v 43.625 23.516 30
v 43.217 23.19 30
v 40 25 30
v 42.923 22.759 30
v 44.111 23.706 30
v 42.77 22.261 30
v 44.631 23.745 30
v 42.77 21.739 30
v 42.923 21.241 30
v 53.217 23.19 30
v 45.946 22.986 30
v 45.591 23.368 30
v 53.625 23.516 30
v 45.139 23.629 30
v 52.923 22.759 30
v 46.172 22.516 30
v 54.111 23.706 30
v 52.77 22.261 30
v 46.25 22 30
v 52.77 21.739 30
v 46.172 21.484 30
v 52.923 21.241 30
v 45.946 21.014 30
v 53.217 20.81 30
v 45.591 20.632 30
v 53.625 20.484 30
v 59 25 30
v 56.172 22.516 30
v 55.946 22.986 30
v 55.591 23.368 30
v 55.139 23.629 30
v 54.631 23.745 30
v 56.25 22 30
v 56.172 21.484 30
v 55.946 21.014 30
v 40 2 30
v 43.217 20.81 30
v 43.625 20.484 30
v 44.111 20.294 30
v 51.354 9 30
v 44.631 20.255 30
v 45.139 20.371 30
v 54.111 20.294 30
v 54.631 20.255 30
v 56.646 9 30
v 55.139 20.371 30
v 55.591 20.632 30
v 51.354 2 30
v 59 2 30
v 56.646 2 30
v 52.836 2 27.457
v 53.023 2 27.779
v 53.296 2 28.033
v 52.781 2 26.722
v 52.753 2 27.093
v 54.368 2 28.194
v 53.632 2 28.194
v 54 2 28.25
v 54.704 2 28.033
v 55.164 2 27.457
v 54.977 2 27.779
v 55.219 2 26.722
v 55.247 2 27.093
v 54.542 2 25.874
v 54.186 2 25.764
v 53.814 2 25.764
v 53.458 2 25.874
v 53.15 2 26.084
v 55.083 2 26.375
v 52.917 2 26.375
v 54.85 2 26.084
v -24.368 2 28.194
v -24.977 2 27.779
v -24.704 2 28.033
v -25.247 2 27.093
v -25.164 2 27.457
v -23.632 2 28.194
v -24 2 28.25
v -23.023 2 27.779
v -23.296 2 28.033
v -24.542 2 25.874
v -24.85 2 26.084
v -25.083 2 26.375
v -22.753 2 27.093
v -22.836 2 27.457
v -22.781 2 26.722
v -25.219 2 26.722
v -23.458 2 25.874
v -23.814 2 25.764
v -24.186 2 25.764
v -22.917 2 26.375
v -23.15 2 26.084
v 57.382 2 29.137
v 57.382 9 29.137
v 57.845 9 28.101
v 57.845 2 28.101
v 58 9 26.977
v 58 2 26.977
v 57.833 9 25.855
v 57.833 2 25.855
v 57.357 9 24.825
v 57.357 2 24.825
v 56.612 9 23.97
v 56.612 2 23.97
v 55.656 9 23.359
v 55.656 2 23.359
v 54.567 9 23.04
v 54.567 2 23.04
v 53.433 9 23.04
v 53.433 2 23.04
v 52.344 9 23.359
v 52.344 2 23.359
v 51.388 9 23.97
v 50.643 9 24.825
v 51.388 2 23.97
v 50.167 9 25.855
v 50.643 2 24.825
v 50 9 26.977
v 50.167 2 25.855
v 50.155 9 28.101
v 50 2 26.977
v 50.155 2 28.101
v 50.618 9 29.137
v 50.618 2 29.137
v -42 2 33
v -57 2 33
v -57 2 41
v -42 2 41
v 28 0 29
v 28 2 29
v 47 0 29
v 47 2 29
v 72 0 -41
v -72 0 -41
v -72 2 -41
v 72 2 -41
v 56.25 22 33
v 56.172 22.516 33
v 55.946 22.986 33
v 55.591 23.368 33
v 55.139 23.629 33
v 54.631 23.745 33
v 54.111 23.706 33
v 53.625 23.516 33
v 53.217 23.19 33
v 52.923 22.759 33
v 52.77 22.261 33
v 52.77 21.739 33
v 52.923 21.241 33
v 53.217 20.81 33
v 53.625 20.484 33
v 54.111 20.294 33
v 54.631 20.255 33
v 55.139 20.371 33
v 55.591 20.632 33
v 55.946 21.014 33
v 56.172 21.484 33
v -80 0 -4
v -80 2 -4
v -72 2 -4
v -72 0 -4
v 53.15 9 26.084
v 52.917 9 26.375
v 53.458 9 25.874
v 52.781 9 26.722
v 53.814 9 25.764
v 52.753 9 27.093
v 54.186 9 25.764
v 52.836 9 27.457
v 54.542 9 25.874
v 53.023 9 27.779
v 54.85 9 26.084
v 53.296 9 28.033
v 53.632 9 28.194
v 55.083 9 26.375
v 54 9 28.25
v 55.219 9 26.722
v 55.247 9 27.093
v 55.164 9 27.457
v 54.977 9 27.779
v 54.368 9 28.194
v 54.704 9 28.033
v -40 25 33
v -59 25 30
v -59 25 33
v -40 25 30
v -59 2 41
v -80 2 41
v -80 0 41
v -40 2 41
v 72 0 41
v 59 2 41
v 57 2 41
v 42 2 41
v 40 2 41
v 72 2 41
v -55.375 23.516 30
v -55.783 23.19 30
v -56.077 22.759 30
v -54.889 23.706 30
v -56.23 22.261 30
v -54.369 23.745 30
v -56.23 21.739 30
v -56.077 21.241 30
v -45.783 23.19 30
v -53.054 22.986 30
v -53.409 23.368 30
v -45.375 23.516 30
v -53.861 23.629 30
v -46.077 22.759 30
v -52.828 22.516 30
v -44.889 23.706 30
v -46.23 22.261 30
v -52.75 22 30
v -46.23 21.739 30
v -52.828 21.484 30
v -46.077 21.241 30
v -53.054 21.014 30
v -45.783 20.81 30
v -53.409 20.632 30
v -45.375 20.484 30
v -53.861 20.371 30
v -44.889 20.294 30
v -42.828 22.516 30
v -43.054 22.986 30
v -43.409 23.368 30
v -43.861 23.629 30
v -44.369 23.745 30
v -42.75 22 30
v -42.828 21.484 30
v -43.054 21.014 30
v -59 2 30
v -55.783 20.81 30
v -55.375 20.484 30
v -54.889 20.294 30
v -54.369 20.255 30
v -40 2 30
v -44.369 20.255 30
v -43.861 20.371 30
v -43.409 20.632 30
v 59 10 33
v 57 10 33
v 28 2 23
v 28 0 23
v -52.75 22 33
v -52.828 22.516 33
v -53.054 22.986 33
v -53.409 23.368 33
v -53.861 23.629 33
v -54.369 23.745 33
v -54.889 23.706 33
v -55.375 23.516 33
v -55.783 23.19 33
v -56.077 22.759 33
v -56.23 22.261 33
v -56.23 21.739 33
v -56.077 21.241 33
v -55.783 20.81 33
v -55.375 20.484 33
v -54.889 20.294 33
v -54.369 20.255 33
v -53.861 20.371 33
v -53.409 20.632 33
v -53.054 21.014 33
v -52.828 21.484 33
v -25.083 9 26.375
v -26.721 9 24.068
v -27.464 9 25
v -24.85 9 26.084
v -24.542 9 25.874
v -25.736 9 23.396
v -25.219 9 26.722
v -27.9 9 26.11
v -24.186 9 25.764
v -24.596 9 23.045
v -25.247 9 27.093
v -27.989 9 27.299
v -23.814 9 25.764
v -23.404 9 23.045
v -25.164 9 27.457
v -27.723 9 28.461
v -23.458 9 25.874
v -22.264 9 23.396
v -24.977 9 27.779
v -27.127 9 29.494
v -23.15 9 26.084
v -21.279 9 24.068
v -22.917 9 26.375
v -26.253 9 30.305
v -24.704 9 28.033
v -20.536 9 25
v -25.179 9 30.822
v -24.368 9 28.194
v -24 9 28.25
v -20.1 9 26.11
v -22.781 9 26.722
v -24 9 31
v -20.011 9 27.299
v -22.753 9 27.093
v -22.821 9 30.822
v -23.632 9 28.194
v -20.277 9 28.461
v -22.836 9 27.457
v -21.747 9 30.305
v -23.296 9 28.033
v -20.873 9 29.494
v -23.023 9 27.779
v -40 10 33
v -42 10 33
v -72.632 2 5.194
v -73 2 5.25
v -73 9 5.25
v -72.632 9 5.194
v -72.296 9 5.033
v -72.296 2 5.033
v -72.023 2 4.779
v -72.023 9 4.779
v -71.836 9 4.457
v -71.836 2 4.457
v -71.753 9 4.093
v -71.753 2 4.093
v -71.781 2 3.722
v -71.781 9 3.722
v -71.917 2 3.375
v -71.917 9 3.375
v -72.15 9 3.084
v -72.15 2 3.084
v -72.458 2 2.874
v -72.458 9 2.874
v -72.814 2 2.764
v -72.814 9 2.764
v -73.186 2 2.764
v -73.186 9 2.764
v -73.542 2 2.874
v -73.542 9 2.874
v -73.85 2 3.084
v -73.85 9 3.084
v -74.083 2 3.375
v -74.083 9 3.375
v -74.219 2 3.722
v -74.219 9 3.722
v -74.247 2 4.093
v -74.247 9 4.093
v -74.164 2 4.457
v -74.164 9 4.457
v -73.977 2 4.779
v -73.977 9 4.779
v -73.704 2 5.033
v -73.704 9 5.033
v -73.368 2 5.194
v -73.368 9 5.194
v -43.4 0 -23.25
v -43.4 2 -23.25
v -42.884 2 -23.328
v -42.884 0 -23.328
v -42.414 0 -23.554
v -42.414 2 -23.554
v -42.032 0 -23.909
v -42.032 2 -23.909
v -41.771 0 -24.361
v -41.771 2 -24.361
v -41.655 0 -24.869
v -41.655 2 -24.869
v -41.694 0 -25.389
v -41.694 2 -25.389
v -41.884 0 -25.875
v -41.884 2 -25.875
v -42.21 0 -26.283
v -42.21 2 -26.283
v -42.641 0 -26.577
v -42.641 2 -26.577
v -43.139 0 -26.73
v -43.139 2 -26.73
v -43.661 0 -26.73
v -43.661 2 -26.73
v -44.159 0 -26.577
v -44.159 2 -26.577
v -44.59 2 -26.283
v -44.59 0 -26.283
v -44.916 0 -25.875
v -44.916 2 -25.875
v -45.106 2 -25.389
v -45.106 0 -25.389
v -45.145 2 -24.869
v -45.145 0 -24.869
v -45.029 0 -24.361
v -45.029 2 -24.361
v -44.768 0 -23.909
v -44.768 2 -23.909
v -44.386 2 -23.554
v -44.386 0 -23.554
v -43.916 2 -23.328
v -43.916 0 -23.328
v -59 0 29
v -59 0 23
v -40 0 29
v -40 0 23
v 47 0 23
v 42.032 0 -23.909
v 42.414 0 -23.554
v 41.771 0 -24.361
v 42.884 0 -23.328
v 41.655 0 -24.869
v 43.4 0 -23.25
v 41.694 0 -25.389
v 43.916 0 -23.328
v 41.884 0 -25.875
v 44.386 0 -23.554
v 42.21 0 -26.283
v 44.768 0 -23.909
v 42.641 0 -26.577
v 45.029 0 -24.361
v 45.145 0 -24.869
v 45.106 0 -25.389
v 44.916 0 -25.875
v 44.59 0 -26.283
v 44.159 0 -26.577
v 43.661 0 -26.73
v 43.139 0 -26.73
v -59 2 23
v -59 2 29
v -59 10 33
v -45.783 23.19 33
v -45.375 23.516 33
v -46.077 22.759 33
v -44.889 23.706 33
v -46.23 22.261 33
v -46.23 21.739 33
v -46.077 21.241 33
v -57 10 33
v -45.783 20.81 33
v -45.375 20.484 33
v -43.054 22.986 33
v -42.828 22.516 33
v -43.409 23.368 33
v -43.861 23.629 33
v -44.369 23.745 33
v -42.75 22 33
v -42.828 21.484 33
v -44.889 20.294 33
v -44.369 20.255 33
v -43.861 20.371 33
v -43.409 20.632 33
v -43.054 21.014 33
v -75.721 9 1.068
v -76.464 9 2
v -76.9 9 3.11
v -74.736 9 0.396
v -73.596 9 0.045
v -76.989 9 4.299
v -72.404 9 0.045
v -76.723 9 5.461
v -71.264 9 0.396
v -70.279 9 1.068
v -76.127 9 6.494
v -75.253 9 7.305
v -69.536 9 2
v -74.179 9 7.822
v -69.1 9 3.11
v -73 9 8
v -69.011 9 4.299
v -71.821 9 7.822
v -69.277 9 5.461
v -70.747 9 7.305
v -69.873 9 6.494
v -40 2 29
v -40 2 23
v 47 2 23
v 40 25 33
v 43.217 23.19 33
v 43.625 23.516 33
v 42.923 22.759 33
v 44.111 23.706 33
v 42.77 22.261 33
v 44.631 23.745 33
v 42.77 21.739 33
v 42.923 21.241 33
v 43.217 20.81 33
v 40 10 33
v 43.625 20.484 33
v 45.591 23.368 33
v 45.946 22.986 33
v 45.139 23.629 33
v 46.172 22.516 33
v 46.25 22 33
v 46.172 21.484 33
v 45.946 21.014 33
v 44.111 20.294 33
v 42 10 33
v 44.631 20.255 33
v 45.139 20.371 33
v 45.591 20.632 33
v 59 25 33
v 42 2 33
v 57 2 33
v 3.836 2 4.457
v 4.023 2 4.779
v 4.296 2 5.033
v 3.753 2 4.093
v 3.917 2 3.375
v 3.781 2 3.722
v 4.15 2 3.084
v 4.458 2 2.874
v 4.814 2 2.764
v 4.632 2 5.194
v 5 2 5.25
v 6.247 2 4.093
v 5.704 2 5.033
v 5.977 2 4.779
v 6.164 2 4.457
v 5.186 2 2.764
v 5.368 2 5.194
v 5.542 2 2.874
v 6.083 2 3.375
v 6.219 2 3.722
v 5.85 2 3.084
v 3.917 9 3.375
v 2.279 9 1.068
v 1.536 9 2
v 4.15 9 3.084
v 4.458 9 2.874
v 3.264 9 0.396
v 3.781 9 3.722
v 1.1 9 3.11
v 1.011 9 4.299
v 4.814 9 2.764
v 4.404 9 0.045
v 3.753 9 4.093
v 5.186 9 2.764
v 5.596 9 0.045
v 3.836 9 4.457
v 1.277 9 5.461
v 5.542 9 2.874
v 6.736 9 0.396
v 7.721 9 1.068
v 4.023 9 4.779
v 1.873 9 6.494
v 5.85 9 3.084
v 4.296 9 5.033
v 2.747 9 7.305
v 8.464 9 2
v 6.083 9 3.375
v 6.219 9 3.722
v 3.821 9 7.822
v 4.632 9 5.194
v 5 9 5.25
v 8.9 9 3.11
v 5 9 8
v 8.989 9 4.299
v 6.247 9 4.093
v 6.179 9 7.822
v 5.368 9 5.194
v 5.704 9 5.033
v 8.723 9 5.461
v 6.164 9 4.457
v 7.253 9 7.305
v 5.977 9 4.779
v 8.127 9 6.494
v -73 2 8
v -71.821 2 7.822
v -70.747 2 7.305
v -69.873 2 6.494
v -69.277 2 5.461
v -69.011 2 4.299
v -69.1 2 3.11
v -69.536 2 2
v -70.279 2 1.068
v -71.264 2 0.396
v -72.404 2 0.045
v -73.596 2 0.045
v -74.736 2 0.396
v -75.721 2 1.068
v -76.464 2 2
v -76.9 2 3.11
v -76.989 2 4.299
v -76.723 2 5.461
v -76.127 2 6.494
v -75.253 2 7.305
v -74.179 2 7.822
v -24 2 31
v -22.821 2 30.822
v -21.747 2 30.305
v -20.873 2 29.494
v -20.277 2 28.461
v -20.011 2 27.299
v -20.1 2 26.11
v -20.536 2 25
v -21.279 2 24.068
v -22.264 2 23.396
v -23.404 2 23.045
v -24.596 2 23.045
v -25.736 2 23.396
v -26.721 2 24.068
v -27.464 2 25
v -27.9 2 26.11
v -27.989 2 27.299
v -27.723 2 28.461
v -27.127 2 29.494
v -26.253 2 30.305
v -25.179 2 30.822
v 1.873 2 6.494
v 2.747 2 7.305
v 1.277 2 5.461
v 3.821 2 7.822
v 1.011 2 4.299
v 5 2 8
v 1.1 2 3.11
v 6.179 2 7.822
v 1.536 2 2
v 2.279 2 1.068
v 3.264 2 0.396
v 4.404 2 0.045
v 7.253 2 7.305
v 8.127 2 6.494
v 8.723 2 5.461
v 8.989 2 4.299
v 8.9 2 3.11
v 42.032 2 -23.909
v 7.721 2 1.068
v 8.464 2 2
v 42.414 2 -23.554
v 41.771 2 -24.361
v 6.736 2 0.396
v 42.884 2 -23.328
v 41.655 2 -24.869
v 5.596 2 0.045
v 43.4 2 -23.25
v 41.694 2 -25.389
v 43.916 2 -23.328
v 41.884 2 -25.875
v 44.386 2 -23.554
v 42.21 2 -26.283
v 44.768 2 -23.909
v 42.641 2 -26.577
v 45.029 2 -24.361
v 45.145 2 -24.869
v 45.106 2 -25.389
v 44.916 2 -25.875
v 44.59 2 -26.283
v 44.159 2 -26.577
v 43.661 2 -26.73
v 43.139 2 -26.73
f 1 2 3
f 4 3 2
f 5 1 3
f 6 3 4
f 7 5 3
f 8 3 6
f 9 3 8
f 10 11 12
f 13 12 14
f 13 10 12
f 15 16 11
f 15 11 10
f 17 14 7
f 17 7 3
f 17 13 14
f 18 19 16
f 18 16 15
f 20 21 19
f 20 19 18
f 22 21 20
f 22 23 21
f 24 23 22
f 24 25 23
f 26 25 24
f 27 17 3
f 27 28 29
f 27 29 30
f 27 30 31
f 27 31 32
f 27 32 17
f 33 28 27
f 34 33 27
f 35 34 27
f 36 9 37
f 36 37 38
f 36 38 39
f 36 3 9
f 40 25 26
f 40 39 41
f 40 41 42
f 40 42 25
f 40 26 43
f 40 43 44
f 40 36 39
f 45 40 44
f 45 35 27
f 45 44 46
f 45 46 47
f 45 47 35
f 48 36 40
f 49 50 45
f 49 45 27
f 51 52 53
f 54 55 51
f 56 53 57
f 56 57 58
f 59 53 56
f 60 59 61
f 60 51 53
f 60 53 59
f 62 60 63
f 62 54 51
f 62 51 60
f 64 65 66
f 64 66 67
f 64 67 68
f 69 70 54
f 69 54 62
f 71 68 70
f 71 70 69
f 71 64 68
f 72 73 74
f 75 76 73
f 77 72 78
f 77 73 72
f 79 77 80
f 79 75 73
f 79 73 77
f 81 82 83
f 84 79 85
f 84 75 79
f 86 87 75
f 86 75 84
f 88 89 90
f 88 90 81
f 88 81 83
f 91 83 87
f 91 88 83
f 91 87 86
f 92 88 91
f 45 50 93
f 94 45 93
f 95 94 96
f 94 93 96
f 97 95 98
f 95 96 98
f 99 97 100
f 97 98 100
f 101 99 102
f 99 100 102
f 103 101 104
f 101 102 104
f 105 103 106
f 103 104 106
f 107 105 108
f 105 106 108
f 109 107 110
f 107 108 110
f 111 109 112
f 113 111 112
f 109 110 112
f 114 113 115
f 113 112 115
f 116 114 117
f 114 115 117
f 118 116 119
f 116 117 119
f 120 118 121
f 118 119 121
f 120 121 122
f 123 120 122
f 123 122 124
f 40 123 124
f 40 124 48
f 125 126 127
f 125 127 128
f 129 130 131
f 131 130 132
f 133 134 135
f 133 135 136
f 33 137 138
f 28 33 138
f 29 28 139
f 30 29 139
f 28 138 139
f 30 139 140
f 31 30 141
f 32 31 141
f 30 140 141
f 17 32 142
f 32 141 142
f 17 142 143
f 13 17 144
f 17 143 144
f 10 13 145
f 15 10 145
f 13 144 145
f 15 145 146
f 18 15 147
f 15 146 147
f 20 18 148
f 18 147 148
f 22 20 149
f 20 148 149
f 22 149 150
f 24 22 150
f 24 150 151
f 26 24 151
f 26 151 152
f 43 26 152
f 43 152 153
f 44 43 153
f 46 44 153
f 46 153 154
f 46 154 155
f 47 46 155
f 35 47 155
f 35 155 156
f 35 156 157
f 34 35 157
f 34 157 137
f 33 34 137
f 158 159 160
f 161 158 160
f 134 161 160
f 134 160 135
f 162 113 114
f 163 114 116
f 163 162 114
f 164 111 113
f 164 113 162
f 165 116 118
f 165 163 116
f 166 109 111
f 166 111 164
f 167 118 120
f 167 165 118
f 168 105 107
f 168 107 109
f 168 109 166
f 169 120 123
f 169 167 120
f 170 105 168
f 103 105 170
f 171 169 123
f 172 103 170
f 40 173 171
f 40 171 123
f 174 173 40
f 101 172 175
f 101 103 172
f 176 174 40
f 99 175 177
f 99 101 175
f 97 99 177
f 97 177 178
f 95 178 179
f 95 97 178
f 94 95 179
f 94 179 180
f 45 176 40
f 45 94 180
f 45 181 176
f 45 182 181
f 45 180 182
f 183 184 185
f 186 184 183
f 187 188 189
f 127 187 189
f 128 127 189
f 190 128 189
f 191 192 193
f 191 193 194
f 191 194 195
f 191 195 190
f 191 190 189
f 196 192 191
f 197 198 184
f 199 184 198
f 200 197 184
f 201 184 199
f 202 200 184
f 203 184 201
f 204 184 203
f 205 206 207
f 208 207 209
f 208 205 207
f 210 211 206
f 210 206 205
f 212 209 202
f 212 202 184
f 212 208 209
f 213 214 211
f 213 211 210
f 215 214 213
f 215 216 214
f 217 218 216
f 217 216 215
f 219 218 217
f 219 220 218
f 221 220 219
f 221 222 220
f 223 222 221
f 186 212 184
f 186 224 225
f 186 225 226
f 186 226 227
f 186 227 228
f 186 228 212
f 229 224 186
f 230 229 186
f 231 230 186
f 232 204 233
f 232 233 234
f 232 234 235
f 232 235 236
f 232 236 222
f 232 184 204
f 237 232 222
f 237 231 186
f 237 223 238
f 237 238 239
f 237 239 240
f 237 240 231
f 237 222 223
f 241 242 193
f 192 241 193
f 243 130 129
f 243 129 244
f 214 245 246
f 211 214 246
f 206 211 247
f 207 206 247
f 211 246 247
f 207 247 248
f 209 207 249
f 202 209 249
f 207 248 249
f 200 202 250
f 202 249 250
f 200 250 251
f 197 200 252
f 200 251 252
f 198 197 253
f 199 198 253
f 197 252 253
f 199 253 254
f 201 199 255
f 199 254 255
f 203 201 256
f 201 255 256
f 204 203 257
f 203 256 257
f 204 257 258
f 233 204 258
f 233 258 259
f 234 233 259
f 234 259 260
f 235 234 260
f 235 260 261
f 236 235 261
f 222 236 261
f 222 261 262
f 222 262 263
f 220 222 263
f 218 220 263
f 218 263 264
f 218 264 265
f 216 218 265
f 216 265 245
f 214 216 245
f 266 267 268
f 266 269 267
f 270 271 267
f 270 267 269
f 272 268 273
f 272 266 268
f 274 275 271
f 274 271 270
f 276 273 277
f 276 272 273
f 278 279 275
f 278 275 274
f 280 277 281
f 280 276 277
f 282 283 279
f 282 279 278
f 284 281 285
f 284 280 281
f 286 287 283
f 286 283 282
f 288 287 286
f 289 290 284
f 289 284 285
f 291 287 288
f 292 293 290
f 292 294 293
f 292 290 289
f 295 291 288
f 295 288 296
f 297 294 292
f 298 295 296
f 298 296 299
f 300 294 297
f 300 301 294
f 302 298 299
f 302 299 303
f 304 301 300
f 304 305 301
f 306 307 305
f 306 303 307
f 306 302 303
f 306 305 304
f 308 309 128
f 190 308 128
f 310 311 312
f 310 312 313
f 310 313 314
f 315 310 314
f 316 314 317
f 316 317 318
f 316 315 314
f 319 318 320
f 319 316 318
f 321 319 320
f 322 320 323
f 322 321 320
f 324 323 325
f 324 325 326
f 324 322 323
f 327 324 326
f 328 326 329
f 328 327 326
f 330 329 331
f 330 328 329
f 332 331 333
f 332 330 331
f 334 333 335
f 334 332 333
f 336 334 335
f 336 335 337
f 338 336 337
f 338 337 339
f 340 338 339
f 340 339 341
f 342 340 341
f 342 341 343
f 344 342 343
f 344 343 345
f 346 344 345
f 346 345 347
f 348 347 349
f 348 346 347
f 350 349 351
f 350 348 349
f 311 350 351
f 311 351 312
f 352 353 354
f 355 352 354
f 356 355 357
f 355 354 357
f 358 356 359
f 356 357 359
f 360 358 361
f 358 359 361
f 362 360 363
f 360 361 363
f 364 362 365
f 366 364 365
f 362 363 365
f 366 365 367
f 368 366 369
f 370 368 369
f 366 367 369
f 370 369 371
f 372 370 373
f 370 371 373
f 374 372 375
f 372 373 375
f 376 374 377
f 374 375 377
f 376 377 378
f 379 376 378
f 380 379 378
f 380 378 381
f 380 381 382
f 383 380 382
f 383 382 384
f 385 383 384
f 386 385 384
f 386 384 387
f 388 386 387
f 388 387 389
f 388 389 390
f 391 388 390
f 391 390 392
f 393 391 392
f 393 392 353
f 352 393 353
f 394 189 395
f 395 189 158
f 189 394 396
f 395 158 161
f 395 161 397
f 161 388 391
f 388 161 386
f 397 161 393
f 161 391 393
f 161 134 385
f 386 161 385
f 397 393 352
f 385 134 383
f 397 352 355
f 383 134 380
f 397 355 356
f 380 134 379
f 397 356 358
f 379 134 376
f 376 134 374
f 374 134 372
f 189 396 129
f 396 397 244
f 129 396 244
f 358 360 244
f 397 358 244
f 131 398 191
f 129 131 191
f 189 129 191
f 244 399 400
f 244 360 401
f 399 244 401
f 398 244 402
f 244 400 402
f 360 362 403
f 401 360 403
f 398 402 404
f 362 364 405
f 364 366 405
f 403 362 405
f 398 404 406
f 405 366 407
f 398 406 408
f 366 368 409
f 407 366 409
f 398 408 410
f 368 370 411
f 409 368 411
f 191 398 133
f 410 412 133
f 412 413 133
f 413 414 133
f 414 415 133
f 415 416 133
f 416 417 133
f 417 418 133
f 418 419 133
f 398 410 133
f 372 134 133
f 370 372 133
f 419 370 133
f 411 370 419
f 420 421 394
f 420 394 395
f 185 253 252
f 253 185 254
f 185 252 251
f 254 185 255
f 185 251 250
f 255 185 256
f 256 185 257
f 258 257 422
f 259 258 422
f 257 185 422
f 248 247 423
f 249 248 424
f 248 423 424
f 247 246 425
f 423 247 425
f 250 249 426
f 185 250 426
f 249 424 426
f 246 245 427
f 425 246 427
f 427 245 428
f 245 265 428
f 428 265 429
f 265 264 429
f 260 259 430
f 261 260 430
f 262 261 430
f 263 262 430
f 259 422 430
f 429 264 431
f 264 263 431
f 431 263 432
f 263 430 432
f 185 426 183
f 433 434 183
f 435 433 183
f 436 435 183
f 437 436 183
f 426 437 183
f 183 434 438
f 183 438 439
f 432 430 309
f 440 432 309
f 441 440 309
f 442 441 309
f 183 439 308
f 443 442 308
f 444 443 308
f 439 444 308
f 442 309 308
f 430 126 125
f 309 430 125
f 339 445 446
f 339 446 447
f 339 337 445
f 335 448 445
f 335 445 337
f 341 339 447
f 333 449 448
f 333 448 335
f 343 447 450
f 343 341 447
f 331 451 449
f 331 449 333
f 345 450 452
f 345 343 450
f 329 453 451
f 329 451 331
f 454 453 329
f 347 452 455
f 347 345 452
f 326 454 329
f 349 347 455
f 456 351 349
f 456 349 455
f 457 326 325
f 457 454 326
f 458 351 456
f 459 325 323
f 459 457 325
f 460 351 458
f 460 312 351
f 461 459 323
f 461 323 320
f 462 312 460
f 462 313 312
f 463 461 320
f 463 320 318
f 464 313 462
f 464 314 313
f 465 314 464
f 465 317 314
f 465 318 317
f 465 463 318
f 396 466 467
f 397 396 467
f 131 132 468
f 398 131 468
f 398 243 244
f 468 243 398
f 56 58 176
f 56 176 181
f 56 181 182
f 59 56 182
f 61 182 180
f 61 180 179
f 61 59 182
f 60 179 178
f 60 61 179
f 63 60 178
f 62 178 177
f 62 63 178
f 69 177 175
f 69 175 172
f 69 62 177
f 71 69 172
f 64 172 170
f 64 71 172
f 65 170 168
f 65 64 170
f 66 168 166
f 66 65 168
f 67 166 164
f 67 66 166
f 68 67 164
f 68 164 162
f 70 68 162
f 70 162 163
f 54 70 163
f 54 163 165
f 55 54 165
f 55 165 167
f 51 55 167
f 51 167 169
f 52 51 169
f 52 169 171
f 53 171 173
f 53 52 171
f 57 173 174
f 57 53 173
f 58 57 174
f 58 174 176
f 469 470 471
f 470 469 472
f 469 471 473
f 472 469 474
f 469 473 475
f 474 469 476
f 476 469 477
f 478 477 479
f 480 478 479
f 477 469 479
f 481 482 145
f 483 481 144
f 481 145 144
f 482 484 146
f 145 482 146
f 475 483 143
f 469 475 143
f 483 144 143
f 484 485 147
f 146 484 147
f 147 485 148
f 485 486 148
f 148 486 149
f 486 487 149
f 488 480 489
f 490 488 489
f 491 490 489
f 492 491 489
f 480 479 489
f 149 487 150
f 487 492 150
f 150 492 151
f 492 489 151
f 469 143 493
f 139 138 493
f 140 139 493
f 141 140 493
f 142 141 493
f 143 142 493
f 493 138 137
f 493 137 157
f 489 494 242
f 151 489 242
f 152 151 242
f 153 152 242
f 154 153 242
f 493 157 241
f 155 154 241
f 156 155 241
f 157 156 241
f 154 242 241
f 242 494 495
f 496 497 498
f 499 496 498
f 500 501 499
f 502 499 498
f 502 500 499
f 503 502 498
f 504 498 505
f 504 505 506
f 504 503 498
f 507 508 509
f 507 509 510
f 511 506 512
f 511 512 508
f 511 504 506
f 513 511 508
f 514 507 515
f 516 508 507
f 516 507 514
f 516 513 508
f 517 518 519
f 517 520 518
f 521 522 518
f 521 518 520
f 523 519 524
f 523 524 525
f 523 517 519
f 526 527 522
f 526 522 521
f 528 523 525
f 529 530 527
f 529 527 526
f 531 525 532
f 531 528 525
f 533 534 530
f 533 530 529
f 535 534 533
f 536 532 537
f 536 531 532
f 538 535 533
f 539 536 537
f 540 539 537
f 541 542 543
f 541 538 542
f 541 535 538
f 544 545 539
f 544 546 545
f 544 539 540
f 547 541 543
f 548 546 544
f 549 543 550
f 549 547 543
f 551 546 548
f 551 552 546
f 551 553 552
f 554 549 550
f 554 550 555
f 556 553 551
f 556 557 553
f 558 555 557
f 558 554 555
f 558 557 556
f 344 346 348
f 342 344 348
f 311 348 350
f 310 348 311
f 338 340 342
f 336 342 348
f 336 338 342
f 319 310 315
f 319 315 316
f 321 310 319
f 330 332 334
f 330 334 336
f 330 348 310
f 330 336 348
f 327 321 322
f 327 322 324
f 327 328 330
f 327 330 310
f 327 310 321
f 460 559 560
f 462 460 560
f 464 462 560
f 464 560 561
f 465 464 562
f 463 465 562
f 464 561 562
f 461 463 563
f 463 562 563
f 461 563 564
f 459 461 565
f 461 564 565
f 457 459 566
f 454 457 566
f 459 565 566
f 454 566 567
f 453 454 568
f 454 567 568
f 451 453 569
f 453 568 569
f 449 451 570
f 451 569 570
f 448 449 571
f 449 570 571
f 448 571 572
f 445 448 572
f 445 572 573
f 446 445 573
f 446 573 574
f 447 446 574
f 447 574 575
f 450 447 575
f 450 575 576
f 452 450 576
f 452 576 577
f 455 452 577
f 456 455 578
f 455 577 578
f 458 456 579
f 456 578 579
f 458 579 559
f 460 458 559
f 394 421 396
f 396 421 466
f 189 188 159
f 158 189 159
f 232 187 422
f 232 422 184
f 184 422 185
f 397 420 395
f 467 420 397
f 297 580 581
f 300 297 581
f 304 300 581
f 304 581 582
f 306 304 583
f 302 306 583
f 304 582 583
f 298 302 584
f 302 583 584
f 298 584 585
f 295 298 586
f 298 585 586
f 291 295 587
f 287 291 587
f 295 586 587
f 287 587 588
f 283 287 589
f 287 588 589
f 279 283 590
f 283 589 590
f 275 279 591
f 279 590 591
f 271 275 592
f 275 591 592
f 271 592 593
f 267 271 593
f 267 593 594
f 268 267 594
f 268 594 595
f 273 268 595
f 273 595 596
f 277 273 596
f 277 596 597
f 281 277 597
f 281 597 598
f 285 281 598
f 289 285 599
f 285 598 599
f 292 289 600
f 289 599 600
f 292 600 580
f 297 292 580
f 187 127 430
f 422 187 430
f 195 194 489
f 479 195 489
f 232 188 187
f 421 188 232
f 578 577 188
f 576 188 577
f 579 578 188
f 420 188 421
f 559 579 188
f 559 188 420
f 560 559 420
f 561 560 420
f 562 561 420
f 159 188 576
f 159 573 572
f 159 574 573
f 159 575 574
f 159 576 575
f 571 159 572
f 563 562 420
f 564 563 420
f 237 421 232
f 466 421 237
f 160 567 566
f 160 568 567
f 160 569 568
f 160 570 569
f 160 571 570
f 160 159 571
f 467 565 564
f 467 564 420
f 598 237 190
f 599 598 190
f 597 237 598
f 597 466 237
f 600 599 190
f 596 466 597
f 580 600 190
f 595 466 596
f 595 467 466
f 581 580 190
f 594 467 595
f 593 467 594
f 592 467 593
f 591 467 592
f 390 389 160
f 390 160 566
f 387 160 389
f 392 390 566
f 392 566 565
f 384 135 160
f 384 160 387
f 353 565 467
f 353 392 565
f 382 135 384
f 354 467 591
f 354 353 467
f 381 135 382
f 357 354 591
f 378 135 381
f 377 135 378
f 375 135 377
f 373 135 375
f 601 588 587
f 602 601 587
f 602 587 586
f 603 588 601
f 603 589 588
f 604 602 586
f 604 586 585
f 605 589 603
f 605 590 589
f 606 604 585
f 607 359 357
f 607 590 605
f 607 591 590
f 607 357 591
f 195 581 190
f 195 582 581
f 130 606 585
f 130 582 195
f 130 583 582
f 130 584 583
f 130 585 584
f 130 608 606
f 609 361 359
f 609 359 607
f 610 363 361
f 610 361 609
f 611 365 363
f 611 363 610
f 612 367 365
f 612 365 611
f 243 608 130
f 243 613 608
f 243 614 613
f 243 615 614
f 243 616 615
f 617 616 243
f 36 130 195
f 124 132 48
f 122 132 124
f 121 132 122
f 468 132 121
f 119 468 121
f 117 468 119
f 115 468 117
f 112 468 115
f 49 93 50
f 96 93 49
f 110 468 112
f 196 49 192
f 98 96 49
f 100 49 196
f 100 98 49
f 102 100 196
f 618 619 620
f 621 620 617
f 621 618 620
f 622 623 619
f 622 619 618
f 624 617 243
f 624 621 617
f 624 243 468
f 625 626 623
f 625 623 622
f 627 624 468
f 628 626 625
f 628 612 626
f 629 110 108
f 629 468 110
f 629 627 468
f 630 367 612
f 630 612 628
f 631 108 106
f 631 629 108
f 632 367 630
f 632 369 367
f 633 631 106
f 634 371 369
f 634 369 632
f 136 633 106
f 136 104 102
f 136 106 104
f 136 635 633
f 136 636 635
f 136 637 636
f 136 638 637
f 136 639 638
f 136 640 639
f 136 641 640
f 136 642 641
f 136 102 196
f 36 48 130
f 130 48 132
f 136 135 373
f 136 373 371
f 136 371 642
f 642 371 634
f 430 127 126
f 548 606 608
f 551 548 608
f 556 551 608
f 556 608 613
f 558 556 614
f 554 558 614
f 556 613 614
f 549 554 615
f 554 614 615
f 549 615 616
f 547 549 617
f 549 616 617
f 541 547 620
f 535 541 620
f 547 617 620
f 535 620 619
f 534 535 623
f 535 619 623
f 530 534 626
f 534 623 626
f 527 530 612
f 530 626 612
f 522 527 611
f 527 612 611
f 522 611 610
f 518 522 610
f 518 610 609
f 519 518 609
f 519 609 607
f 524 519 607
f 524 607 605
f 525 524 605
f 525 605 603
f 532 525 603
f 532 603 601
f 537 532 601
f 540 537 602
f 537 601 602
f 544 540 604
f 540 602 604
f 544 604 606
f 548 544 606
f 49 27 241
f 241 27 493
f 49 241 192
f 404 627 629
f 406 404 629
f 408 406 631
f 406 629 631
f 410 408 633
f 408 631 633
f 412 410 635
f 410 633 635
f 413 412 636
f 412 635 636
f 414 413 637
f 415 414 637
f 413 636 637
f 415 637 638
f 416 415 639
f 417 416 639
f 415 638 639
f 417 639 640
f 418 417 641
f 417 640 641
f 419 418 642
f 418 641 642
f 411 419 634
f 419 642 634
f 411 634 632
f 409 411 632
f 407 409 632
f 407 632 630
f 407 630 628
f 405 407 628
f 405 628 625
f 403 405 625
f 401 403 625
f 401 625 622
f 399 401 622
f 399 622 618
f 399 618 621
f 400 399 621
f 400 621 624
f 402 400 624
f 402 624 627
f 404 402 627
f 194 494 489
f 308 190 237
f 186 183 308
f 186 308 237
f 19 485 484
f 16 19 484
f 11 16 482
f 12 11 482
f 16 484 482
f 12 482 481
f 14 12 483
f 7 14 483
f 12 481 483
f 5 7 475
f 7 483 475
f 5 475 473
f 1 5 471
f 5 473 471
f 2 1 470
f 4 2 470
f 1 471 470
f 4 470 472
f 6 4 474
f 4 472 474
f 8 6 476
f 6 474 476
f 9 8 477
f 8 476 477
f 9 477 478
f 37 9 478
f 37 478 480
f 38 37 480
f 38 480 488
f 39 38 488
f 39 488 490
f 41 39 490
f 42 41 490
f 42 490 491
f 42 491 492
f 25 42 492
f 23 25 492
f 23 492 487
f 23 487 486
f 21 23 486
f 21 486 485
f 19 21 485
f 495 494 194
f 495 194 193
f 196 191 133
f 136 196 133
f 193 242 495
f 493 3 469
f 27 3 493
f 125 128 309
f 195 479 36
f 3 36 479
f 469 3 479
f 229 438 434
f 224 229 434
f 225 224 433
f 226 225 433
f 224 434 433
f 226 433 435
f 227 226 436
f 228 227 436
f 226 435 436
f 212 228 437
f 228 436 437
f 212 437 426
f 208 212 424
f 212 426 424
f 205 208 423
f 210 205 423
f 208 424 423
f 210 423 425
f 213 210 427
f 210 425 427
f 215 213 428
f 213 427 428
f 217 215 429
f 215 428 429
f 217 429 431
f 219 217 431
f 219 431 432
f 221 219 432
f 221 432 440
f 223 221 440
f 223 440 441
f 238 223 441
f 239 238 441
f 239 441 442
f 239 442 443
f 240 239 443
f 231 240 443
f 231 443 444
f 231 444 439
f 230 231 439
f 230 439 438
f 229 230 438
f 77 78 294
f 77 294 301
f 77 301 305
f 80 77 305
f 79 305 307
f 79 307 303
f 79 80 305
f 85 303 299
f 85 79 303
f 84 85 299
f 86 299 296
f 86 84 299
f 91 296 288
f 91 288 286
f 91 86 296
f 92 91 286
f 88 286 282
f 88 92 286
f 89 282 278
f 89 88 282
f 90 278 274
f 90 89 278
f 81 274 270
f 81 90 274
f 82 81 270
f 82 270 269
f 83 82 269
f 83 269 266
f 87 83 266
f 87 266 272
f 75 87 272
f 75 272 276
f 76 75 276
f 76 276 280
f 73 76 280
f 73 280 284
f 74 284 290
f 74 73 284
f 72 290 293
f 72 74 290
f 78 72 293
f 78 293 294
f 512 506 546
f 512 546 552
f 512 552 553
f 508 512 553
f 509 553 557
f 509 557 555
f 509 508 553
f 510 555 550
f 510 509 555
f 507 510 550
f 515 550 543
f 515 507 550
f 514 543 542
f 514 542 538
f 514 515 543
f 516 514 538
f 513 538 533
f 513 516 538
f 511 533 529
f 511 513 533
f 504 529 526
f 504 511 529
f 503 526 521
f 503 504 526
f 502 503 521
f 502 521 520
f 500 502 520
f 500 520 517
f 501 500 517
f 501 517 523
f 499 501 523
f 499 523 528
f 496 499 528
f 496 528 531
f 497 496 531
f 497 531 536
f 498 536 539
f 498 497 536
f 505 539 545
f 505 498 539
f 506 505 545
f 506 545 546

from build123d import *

# Parameters (mm, degrees)
CROQUIS1_W              = 144
CROQUIS1_H              = 82
SALIENTE_EXTRUIR1_DEPTH = 2
CROQUIS3_W              = 8
CROQUIS3_H              = 45
SALIENTE_EXTRUIR2_DEPTH = 2
CROQUIS2_R              = 4
CROQUIS2_R_2            = 1.25
SALIENTE_EXTRUIR3_DEPTH = 7
CORTAR_EXTRUIR1_REACH   = 92.167
CROQUIS4_W              = 19
CROQUIS4_H              = 6
CORTAR_EXTRUIR2_REACH   = 92.167
CROQUIS5_R              = 1.75
CROQUIS7_W              = 19
CROQUIS7_H              = 3
SALIENTE_EXTRUIR4_DEPTH = 23
CORTAR_EXTRUIR3_REACH   = 113.808
CROQUIS9_R              = 1.75
NERVIO1_REACH           = 141.524
CROQUIS10_WALL_W        = 292.3620914
CROQUIS10_WALL_H        = 2
NERVIO2_REACH           = 123.861
CROQUIS11_WALL_W        = 257.034860638
CROQUIS11_WALL_H        = 2
NERVIO3_REACH           = 149.061
CROQUIS12_WALL_W        = 307.43613199
CROQUIS12_WALL_H        = 2
NERVIO4_REACH           = 131.252
CROQUIS13_WALL_W        = 271.81709339
CROQUIS13_WALL_H        = 2


with BuildPart() as part:
    # Croquis1 → Saliente-Extruir1 (new body)
    with BuildSketch(Plane(origin=(0, 0, 0), x_dir=(1, 0, 0), z_dir=(0, 1, 0))):
        Rectangle(CROQUIS1_W, CROQUIS1_H)
    extrude(amount=SALIENTE_EXTRUIR1_DEPTH)

    # Croquis3 → Saliente-Extruir2 (add)
    with BuildSketch(Plane(origin=(0, 2, 0), x_dir=(1, 0, 0), z_dir=(0, 1, 0))):
        with Locations((-76, -18.5)):
            Rectangle(CROQUIS3_W, CROQUIS3_H)
    extrude(amount=-SALIENTE_EXTRUIR2_DEPTH)

    # Croquis2 → Saliente-Extruir3 (add)
    # profile 1 of 4: a face of its own
    with BuildSketch(Plane(origin=(0, 2, 0), x_dir=(1, 0, 0), z_dir=(0, 1, 0))):
        with Locations((54, -27)):
            Circle(CROQUIS2_R)
        with Locations((54, -27)):
            Circle(CROQUIS2_R_2, mode=Mode.SUBTRACT)
    # profile 2 of 4: a face of its own
    with BuildSketch(Plane(origin=(0, 2, 0), x_dir=(1, 0, 0), z_dir=(0, 1, 0))):
        with Locations((5, -4)):
            Circle(CROQUIS2_R)
        with Locations((5, -4)):
            Circle(CROQUIS2_R_2, mode=Mode.SUBTRACT)
    # profile 3 of 4: a face of its own
    with BuildSketch(Plane(origin=(0, 2, 0), x_dir=(1, 0, 0), z_dir=(0, 1, 0))):
        with Locations((-24, -27)):
            Circle(CROQUIS2_R)
        with Locations((-24, -27)):
            Circle(CROQUIS2_R_2, mode=Mode.SUBTRACT)
    # profile 4 of 4: a face of its own
    with BuildSketch(Plane(origin=(0, 2, 0), x_dir=(1, 0, 0), z_dir=(0, 1, 0))):
        with Locations((-73, -4)):
            Circle(CROQUIS2_R)
        with Locations((-73, -4)):
            Circle(CROQUIS2_R_2, mode=Mode.SUBTRACT)
    extrude(amount=SALIENTE_EXTRUIR3_DEPTH)

    # Croquis4 → Cortar-Extruir1 (cut, up to next)
    with BuildSketch(Plane(origin=(0, 2, 0), x_dir=(1, 0, 0), z_dir=(0, 1, 0)), mode=Mode.PRIVATE) as cortar_extruir1_sk1:
        with Locations((-49.5, -26)):
            Rectangle(CROQUIS4_W, CROQUIS4_H)
    cortar_extruir1_tool1 = extrude(cortar_extruir1_sk1.sketch, amount=-CORTAR_EXTRUIR1_REACH, mode=Mode.PRIVATE) & part.part
    # Croquis4 → Cortar-Extruir1 (cut, up to next)
    with BuildSketch(Plane(origin=(0, 2, 0), x_dir=(1, 0, 0), z_dir=(0, 1, 0)), mode=Mode.PRIVATE) as cortar_extruir1_sk2:
        with Locations((37.5, -26)):
            Rectangle(CROQUIS4_W, CROQUIS4_H)
    cortar_extruir1_tool2 = extrude(cortar_extruir1_sk2.sketch, amount=-CORTAR_EXTRUIR1_REACH, mode=Mode.PRIVATE) & part.part
    add(cortar_extruir1_tool1.solids().sort_by_distance((-49.5, 2, 26))[0], mode=Mode.SUBTRACT)
    add(cortar_extruir1_tool2.solids().sort_by_distance((37.5, 2, 26))[0], mode=Mode.SUBTRACT)

    # Croquis5 → Cortar-Extruir2 (cut, up to next)
    with BuildSketch(Plane(origin=(0, 2, 0), x_dir=(1, 0, 0), z_dir=(0, 1, 0)), mode=Mode.PRIVATE) as cortar_extruir2_sk1:
        with Locations((-43.4, 25)):
            Circle(CROQUIS5_R)
    cortar_extruir2_tool1 = extrude(cortar_extruir2_sk1.sketch, amount=-CORTAR_EXTRUIR2_REACH, mode=Mode.PRIVATE) & part.part
    # Croquis5 → Cortar-Extruir2 (cut, up to next)
    with BuildSketch(Plane(origin=(0, 2, 0), x_dir=(1, 0, 0), z_dir=(0, 1, 0)), mode=Mode.PRIVATE) as cortar_extruir2_sk2:
        with Locations((43.4, 25)):
            Circle(CROQUIS5_R)
    cortar_extruir2_tool2 = extrude(cortar_extruir2_sk2.sketch, amount=-CORTAR_EXTRUIR2_REACH, mode=Mode.PRIVATE) & part.part
    add(cortar_extruir2_tool1.solids().sort_by_distance((-43.4, 2, -25))[0], mode=Mode.SUBTRACT)
    add(cortar_extruir2_tool2.solids().sort_by_distance((43.4, 2, -25))[0], mode=Mode.SUBTRACT)

    # Croquis7 → Saliente-Extruir4 (add)
    with BuildSketch(Plane(origin=(0, 2, 0), x_dir=(1, 0, 0), z_dir=(0, 1, 0))):
        with Locations((-49.5, -31.5)):
            Rectangle(CROQUIS7_W, CROQUIS7_H)
        with Locations((49.5, -31.5)):
            Rectangle(CROQUIS7_W, CROQUIS7_H)
    extrude(amount=SALIENTE_EXTRUIR4_DEPTH)

    # Croquis9 → Cortar-Extruir3 (cut, up to next)
    with BuildSketch(Plane.XY.offset(33), mode=Mode.PRIVATE) as cortar_extruir3_sk1:
        with Locations((-54.5, 22)):
            Circle(CROQUIS9_R)
    cortar_extruir3_tool1 = extrude(cortar_extruir3_sk1.sketch, amount=-CORTAR_EXTRUIR3_REACH, mode=Mode.PRIVATE) & part.part
    # Croquis9 → Cortar-Extruir3 (cut, up to next)
    with BuildSketch(Plane.XY.offset(33), mode=Mode.PRIVATE) as cortar_extruir3_sk2:
        with Locations((-44.5, 22)):
            Circle(CROQUIS9_R)
    cortar_extruir3_tool2 = extrude(cortar_extruir3_sk2.sketch, amount=-CORTAR_EXTRUIR3_REACH, mode=Mode.PRIVATE) & part.part
    # Croquis9 → Cortar-Extruir3 (cut, up to next)
    with BuildSketch(Plane.XY.offset(33), mode=Mode.PRIVATE) as cortar_extruir3_sk3:
        with Locations((44.5, 22)):
            Circle(CROQUIS9_R)
    cortar_extruir3_tool3 = extrude(cortar_extruir3_sk3.sketch, amount=-CORTAR_EXTRUIR3_REACH, mode=Mode.PRIVATE) & part.part
    # Croquis9 → Cortar-Extruir3 (cut, up to next)
    with BuildSketch(Plane.XY.offset(33), mode=Mode.PRIVATE) as cortar_extruir3_sk4:
        with Locations((54.5, 22)):
            Circle(CROQUIS9_R)
    cortar_extruir3_tool4 = extrude(cortar_extruir3_sk4.sketch, amount=-CORTAR_EXTRUIR3_REACH, mode=Mode.PRIVATE) & part.part
    add(cortar_extruir3_tool1.solids().sort_by_distance((-54.5, 22, 33))[0], mode=Mode.SUBTRACT)
    add(cortar_extruir3_tool2.solids().sort_by_distance((-44.5, 22, 33))[0], mode=Mode.SUBTRACT)
    add(cortar_extruir3_tool3.solids().sort_by_distance((44.5, 22, 33))[0], mode=Mode.SUBTRACT)
    add(cortar_extruir3_tool4.solids().sort_by_distance((54.5, 22, 33))[0], mode=Mode.SUBTRACT)

    # Croquis10 wall → Nervio1 (add, up to next)
    with BuildSketch(Plane(origin=(-59, 6, 37), x_dir=(0, 0.707106781187, -0.707106781187), z_dir=(0, -0.707106781187, -0.707106781187)), mode=Mode.PRIVATE) as nervio1_sk1:
        with Locations((0, 1)):
            Rectangle(CROQUIS10_WALL_W, CROQUIS10_WALL_H)
    nervio1_tool1 = extrude(nervio1_sk1.sketch, amount=NERVIO1_REACH, mode=Mode.PRIVATE) - part.part
    add(nervio1_tool1.solids().sort_by_distance((-59, 6, 37))[0])

    # Croquis11 wall → Nervio2 (add, up to next)
    with BuildSketch(Plane(origin=(-40, 6, 37), x_dir=(0, 0.707106781187, -0.707106781187), z_dir=(0, 0.707106781187, 0.707106781187)), mode=Mode.PRIVATE) as nervio2_sk1:
        with Locations((0, 1)):
            Rectangle(CROQUIS11_WALL_W, CROQUIS11_WALL_H)
    nervio2_tool1 = extrude(nervio2_sk1.sketch, amount=-NERVIO2_REACH, mode=Mode.PRIVATE) - part.part
    add(nervio2_tool1.solids().sort_by_distance((-40, 6, 37))[0])

    # Croquis12 wall → Nervio3 (add, up to next)
    with BuildSketch(Plane(origin=(59, 6, 37), x_dir=(0, -0.707106781187, 0.707106781187), z_dir=(0, -0.707106781187, -0.707106781187)), mode=Mode.PRIVATE) as nervio3_sk1:
        with Locations((0, 1)):
            Rectangle(CROQUIS12_WALL_W, CROQUIS12_WALL_H)
    nervio3_tool1 = extrude(nervio3_sk1.sketch, amount=NERVIO3_REACH, mode=Mode.PRIVATE) - part.part
    add(nervio3_tool1.solids().sort_by_distance((59, 6, 37))[0])

    # Croquis13 wall → Nervio4 (add, up to next)
    with BuildSketch(Plane(origin=(40, 6, 37), x_dir=(0, -0.707106781187, 0.707106781187), z_dir=(0, 0.707106781187, 0.707106781187)), mode=Mode.PRIVATE) as nervio4_sk1:
        with Locations((0, 1)):
            Rectangle(CROQUIS13_WALL_W, CROQUIS13_WALL_H)
    nervio4_tool1 = extrude(nervio4_sk1.sketch, amount=-NERVIO4_REACH, mode=Mode.PRIVATE) - part.part
    add(nervio4_tool1.solids().sort_by_distance((40, 6, 37))[0])


solid = part.part
